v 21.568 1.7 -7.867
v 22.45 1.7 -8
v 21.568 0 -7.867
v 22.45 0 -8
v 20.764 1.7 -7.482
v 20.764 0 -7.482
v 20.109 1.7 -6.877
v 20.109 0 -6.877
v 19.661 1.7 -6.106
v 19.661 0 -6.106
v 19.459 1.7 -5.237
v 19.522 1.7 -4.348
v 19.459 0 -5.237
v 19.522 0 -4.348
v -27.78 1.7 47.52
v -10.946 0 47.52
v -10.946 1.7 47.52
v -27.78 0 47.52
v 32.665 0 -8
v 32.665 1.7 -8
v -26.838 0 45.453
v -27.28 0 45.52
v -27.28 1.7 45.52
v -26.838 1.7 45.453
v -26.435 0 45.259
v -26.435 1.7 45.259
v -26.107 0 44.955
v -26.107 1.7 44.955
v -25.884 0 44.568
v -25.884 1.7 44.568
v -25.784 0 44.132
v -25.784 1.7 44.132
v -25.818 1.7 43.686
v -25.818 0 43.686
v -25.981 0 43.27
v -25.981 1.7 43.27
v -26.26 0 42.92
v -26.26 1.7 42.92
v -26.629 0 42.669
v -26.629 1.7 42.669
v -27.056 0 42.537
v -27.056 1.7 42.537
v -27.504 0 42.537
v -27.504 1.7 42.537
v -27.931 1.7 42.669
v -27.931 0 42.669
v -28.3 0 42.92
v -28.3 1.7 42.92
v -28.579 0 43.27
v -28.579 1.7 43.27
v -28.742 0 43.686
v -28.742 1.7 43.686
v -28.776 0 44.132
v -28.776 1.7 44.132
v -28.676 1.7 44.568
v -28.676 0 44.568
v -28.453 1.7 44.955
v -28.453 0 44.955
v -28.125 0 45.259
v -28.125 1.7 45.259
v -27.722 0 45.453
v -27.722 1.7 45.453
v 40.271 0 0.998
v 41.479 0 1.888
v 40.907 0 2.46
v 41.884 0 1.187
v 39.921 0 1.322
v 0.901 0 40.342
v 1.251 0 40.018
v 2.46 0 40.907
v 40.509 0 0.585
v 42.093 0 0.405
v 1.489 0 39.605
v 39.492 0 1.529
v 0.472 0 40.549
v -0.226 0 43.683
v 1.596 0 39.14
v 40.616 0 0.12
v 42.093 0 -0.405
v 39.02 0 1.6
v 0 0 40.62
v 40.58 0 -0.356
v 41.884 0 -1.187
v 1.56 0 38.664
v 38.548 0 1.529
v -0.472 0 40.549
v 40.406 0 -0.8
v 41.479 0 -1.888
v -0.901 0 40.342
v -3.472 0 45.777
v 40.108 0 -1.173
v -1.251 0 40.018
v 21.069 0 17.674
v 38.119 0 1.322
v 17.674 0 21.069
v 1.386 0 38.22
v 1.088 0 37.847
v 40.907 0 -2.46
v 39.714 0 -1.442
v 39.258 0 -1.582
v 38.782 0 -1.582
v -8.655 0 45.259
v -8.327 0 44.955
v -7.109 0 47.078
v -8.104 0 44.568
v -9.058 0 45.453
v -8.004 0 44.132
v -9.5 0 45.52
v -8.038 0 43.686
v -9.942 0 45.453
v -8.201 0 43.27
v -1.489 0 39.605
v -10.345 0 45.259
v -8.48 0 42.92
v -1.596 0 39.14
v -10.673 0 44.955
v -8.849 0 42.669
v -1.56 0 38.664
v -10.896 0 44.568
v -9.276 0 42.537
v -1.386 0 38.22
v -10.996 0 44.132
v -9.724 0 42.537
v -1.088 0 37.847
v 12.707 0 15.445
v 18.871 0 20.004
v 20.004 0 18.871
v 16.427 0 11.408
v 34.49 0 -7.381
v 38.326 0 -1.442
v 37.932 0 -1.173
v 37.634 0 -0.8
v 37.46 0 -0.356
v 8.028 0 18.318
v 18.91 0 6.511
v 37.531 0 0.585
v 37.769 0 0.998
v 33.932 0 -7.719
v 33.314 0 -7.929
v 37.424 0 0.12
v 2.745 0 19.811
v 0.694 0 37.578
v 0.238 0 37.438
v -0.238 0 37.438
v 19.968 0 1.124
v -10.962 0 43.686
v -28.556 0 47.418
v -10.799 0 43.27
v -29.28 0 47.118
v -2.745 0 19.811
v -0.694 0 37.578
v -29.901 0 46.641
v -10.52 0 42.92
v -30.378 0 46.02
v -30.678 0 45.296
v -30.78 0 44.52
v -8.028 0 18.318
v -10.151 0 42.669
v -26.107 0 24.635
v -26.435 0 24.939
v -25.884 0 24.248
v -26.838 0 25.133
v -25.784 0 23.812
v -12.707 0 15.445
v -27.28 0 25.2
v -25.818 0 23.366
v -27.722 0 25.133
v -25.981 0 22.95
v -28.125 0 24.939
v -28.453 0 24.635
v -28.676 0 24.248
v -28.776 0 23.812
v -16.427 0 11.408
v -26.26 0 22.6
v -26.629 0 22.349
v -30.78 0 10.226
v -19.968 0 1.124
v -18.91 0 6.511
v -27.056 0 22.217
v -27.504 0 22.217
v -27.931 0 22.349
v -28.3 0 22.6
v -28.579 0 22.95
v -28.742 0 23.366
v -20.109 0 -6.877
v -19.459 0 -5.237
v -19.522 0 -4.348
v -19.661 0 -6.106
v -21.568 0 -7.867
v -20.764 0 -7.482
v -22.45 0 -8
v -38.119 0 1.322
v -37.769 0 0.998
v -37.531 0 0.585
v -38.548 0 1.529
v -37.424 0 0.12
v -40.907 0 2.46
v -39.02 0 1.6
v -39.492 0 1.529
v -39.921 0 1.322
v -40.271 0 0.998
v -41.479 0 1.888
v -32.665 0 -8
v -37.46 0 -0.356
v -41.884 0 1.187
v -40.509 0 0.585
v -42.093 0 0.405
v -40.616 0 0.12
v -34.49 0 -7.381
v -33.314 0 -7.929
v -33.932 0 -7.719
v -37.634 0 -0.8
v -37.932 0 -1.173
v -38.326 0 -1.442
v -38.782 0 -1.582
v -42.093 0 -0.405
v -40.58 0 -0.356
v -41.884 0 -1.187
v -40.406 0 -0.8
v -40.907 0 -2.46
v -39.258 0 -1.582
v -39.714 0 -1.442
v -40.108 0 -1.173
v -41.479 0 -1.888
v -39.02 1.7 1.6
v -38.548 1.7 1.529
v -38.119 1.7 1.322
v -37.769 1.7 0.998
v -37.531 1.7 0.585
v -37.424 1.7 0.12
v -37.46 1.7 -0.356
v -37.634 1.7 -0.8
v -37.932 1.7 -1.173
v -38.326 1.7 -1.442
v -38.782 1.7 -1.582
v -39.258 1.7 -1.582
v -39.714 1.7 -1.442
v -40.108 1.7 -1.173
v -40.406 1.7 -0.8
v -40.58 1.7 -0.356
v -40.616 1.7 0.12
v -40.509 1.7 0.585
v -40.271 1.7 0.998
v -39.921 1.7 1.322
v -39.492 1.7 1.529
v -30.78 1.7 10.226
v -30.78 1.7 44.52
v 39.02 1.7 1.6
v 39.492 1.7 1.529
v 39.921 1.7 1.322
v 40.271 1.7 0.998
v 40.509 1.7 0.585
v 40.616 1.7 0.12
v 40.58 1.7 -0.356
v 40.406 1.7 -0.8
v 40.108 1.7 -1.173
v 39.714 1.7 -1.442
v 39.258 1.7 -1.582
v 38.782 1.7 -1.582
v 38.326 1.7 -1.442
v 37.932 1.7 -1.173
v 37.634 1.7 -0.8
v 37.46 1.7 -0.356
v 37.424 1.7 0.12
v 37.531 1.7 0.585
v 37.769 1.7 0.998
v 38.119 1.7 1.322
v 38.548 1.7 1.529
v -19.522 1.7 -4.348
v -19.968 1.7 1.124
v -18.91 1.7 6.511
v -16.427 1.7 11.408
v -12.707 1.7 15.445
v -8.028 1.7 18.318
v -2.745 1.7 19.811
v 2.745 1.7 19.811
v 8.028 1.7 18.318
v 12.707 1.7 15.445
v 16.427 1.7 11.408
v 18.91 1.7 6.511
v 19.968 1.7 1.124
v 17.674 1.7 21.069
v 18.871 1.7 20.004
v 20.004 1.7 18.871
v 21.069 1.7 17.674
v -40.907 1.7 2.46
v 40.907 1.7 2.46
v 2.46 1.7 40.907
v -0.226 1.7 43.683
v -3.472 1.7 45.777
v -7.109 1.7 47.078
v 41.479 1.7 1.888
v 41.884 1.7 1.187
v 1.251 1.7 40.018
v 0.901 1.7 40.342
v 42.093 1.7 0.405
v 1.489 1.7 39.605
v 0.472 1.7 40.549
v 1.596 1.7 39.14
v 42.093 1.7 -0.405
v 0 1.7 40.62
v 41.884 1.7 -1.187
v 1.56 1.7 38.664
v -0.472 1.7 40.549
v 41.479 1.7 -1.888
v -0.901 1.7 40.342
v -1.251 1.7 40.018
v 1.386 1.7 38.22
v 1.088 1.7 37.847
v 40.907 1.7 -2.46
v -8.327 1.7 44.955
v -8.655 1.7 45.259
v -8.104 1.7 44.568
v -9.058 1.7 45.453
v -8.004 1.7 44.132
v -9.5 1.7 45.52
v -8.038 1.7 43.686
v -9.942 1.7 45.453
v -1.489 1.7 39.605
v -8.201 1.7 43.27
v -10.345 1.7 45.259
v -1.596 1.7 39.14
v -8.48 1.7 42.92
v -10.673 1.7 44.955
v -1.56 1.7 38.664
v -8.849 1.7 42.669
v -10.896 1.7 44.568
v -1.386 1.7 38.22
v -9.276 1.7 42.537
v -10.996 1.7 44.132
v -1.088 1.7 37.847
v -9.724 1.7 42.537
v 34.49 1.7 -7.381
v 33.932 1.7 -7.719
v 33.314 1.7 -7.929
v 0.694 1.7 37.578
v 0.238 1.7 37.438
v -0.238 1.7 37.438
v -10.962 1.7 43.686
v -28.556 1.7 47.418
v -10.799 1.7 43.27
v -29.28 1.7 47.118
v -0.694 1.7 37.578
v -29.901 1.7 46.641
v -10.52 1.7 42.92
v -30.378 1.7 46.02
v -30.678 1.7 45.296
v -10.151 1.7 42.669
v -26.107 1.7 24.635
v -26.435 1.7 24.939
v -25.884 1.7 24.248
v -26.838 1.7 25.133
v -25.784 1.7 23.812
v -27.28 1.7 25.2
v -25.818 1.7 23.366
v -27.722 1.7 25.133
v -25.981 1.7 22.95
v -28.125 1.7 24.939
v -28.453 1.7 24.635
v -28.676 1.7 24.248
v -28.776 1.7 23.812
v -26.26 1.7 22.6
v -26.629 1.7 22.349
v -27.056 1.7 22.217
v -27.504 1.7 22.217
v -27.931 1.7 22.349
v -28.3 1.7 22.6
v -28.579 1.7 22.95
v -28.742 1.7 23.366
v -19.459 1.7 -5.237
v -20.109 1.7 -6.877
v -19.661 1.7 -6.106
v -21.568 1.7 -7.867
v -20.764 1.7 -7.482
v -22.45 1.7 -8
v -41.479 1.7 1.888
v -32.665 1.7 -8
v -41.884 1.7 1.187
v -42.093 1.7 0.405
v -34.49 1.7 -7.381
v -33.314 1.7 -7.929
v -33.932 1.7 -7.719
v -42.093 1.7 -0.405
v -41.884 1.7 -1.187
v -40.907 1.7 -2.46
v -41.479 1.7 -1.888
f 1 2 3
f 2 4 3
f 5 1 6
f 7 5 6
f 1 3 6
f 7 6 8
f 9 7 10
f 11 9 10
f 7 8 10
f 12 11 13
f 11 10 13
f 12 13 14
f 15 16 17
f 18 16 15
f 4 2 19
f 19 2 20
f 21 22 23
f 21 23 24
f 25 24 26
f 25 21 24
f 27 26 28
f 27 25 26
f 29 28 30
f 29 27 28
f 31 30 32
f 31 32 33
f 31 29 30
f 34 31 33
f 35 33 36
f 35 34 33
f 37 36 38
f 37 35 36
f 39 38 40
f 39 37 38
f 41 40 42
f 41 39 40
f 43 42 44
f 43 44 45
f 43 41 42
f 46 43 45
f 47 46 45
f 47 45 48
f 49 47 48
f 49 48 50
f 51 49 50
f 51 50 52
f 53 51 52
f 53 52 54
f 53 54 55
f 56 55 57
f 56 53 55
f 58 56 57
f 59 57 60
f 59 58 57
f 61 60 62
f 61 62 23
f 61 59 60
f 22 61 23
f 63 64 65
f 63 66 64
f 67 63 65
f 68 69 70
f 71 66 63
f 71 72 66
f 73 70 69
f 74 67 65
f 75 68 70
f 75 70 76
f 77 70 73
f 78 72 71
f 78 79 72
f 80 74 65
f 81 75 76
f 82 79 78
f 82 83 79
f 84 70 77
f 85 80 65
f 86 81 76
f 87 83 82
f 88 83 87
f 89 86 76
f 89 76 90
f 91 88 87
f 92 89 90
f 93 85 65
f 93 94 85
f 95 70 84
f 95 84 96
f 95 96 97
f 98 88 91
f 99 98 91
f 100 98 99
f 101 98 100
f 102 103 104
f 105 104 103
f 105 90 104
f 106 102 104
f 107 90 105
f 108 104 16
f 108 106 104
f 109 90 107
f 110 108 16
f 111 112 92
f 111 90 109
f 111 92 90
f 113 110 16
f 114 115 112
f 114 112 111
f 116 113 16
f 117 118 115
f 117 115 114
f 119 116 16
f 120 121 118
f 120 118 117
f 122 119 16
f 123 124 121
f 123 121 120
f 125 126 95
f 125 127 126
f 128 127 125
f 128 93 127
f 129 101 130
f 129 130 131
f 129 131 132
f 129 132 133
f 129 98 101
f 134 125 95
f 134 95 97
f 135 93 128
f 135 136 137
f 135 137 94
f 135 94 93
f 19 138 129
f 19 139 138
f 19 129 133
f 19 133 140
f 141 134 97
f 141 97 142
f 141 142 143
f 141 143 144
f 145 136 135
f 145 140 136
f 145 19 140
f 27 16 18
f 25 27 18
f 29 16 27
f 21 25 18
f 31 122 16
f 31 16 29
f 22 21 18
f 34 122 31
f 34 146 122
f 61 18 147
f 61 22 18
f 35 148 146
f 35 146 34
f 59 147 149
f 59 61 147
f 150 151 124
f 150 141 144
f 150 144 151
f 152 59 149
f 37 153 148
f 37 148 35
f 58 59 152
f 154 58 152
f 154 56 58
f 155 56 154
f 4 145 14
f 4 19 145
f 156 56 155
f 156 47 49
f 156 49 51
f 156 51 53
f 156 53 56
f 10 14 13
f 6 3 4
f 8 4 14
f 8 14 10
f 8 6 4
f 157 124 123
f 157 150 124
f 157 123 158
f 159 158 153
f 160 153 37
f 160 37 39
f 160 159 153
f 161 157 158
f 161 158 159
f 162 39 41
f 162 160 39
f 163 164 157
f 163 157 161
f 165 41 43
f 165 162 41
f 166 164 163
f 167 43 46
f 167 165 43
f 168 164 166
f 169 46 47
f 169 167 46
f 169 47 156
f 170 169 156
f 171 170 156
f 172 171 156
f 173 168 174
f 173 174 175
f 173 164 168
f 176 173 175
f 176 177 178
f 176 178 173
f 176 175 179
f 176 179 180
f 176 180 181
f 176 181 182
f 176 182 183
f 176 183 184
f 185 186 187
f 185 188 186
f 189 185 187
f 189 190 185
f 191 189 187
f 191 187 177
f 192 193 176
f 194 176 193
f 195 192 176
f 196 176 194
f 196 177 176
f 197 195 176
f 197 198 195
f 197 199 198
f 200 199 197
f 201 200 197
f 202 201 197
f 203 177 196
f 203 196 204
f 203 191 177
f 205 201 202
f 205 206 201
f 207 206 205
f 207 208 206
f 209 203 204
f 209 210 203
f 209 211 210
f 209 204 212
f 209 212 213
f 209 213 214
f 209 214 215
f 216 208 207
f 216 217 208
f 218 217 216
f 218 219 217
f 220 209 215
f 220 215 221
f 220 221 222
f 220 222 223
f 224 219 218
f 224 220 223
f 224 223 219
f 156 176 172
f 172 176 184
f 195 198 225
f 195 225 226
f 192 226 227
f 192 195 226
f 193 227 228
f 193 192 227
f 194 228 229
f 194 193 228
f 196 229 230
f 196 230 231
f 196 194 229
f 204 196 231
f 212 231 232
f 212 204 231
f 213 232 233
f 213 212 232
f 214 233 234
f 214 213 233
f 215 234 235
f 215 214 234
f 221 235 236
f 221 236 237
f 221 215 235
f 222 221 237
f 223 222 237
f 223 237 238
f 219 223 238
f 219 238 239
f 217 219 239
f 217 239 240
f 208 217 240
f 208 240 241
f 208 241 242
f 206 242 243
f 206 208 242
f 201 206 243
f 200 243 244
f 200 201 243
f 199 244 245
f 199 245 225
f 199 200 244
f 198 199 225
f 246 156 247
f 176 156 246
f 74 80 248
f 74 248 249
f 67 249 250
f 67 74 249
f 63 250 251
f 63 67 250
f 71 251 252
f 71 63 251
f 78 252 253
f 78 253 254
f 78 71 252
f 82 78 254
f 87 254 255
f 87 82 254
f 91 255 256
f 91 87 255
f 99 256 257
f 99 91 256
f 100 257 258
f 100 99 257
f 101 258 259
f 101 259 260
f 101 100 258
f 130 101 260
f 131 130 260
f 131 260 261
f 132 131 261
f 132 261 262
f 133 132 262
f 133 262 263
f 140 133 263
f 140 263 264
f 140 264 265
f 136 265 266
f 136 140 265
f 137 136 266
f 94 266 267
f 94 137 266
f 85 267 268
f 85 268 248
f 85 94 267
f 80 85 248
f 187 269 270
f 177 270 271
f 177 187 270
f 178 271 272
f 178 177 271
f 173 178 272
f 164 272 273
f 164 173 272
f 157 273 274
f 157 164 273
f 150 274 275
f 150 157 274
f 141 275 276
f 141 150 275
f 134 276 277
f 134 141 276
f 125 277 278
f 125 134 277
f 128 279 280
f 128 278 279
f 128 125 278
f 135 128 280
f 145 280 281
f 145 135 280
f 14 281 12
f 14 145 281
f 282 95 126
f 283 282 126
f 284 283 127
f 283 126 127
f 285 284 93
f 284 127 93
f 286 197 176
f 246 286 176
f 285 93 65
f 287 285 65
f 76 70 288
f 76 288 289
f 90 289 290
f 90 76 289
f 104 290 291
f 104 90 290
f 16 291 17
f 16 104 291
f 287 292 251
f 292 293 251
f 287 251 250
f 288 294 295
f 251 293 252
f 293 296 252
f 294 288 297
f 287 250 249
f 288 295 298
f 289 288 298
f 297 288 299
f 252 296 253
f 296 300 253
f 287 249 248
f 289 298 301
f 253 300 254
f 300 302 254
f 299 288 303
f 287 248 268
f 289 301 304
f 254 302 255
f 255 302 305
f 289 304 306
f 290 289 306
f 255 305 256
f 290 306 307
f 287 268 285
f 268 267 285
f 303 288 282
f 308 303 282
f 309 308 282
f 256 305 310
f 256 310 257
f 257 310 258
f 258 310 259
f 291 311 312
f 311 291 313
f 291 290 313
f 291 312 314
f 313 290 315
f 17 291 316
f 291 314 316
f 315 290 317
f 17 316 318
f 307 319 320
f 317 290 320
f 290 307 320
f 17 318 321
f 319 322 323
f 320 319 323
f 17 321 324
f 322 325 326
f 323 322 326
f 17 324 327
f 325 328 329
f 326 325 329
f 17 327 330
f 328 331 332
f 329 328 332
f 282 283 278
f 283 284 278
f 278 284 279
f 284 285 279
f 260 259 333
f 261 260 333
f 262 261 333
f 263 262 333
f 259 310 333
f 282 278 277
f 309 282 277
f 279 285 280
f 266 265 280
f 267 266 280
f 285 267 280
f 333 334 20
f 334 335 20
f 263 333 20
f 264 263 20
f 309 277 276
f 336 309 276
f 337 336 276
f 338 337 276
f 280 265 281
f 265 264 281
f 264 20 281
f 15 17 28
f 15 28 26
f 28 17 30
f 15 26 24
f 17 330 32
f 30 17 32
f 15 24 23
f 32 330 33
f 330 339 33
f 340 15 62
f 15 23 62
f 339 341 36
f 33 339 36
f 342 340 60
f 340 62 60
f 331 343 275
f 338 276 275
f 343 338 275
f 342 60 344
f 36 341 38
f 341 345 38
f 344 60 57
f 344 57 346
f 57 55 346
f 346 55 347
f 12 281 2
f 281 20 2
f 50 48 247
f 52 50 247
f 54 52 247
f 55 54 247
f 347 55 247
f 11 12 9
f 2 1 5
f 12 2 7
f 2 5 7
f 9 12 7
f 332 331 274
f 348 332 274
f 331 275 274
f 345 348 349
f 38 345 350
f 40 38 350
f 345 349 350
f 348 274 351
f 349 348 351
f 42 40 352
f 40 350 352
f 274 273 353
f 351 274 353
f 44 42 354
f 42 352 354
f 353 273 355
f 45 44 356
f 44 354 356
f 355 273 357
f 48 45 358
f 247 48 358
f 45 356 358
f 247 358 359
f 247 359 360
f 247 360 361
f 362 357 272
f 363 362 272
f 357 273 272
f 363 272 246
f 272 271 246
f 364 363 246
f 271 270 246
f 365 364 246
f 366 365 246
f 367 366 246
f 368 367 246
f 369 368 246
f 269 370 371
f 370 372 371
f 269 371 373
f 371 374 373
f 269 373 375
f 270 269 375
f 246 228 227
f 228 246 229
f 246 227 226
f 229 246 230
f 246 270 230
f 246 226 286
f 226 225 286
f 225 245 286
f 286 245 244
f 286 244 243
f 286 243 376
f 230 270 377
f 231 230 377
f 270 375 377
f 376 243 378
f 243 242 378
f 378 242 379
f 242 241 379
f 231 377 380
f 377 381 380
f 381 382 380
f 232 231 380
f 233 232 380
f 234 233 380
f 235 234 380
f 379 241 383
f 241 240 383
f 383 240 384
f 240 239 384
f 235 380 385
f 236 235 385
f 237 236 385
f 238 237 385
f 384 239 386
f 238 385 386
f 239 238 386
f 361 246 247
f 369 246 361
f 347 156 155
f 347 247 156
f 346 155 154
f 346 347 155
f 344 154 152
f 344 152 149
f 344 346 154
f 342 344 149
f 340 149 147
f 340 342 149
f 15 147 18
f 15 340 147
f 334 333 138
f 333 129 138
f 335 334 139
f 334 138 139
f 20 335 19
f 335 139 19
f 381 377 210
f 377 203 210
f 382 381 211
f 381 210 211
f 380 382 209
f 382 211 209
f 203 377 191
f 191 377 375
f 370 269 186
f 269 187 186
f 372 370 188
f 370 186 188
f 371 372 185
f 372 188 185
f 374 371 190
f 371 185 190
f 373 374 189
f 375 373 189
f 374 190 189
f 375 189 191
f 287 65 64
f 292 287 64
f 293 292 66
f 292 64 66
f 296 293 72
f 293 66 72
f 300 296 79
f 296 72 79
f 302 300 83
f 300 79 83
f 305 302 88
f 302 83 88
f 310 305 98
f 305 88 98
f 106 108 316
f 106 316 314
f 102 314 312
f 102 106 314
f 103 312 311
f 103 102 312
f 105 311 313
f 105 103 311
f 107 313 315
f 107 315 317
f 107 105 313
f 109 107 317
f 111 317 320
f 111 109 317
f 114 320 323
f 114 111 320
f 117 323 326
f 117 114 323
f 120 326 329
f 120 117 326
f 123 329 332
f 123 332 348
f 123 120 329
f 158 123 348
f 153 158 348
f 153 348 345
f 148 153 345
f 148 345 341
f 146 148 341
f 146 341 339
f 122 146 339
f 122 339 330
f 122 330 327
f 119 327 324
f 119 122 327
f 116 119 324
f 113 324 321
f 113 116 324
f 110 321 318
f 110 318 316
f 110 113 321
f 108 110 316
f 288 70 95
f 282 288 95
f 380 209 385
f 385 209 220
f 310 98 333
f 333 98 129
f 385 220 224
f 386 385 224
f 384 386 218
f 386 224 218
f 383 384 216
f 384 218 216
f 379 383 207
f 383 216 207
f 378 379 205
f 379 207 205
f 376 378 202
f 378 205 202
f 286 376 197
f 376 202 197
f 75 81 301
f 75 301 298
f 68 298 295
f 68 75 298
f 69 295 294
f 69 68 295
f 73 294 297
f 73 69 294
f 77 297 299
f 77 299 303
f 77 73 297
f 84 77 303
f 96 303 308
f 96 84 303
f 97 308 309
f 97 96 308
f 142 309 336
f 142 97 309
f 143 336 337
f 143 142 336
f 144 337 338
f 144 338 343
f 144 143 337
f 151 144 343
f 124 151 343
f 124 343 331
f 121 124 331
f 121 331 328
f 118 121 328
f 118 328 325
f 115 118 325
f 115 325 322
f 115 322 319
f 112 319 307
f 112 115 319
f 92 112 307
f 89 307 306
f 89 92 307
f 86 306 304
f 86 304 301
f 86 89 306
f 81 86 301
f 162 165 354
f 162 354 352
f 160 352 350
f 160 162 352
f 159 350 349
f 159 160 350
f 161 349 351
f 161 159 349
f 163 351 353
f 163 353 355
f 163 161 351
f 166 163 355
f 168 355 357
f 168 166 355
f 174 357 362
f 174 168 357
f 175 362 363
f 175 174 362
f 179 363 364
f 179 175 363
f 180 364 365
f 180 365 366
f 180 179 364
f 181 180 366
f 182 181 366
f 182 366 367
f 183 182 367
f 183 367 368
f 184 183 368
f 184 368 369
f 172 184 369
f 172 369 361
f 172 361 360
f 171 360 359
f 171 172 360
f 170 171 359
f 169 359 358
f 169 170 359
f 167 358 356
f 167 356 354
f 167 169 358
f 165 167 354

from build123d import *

# Parameters (mm, degrees)
SKETCH1_R           = 1.6
SKETCH1_R_2         = 20
BOSS_EXTRUDE2_DEPTH = 1.7
BOSS_EXTRUDE3_START = -1.7
SKETCH2_R           = 1.5
BOSS_EXTRUDE3_DEPTH = 1.7
SKETCH3_W           = 67.365157796
SKETCH3_H           = 36
CUT_EXTRUDE1_DEPTH  = 1.7
FILLET1_R           = 3


with BuildPart() as part:
    # Sketch1 → Boss-Extrude2 (new body)
    with BuildSketch(Plane(origin=(0, 0, 0), x_dir=(1, 0, 0), z_dir=(0, 1, 0))):
        with BuildLine():
            Line((-17.673720383, -21.068687852), (-2.459890554, -40.906514899))
            ThreePointArc((-2.459890554, -40.906514899), (0, -42.12), (2.459890554, -40.906514899))
            Line((2.459890554, -40.906514899), (17.673720383, -21.068687852))
            ThreePointArc((17.673720383, -21.068687852), (19.445436483, -19.445436483), (21.068687852, -17.673720383))
            Line((21.068687852, -17.673720383), (40.906514899, -2.459890554))
            ThreePointArc((40.906514899, -2.459890554), (42.12, 0), (40.906514899, 2.459890554))
            Line((40.906514899, 2.459890554), (21.068687852, 17.673720383))
            ThreePointArc((21.068687852, 17.673720383), (19.445436483, 19.445436483), (17.673720383, 21.068687852))
            Line((17.673720383, 21.068687852), (2.459890554, 40.906514899))
            ThreePointArc((2.459890554, 40.906514899), (0, 42.12), (-2.459890554, 40.906514899))
            Line((-2.459890554, 40.906514899), (-17.673720383, 21.068687852))
            ThreePointArc((-17.673720383, 21.068687852), (-19.445436483, 19.445436483), (-21.068687852, 17.673720383))
            Line((-21.068687852, 17.673720383), (-40.906514899, 2.459890554))
            ThreePointArc((-40.906514899, 2.459890554), (-42.12, 0), (-40.906514899, -2.459890554))
            Line((-40.906514899, -2.459890554), (-21.068687852, -17.673720383))
            ThreePointArc((-21.068687852, -17.673720383), (-19.445436483, -19.445436483), (-17.673720383, -21.068687852))
        make_face()
        with Locations(Location((0, -39.02, 0), (0, 0, 270))):
            Circle(SKETCH1_R, mode=Mode.SUBTRACT)
        with Locations(Location((0, 0, 0), (0, 0, 270))):
            Circle(SKETCH1_R_2, mode=Mode.SUBTRACT)
        with Locations(Location((-39.02, 0, 0), (0, 0, 270))):
            Circle(SKETCH1_R, mode=Mode.SUBTRACT)
        with Locations(Location((39.02, 0, 0), (0, 0, 270))):
            Circle(SKETCH1_R, mode=Mode.SUBTRACT)
        with Locations(Location((0, 39.02, 0), (0, 0, 270))):
            Circle(SKETCH1_R, mode=Mode.SUBTRACT)
    extrude(amount=BOSS_EXTRUDE2_DEPTH)

    # Sketch2 → Boss-Extrude3 (add)
    with BuildSketch(Plane(origin=(0, 1.7, 0), x_dir=(1, 0, 0), z_dir=(0, 1, 0)).offset(BOSS_EXTRUDE3_START)):
        with BuildLine():
            Line((-30.78, -47.52), (-30.78, -10.226017059))
            Line((-30.78, -10.226017059), (-21.068687852, -17.673720383))
            ThreePointArc((-21.068687852, -17.673720383), (-19.445436483, -19.445436483), (-17.673720383, -21.068687852))
            Line((-17.673720383, -21.068687852), (-2.459890554, -40.906514899))
            ThreePointArc((-2.459890554, -40.906514899), (0, -42.12), (2.459890554, -40.906514899))
            ThreePointArc((2.459890554, -40.906514899), (-3.472049402, -45.77668656), (-10.946495328, -47.52))
            Line((-10.946495328, -47.52), (-30.78, -47.52))
        make_face()
        with Locations(Location((-9.5, -44.02, 0), (0, 0, 270))):
            Circle(SKETCH2_R, mode=Mode.SUBTRACT)
        with Locations(Location((-27.28, -44.02, 0), (0, 0, 270))):
            Circle(SKETCH2_R, mode=Mode.SUBTRACT)
        with Locations(Location((-27.28, -23.7, 0), (0, 0, 270))):
            Circle(SKETCH2_R, mode=Mode.SUBTRACT)
    extrude(amount=BOSS_EXTRUDE3_DEPTH)

    # Sketch3 → Cut-Extrude1 (cut)
    with BuildSketch(Plane(origin=(0, 1.7, 0), x_dir=(1, 0, 0), z_dir=(0, 1, 0))):
        with Locations((0, 26)):
            Rectangle(SKETCH3_W, SKETCH3_H)
    extrude(amount=-CUT_EXTRUDE1_DEPTH, mode=Mode.SUBTRACT)

    # Fillet1
    fillet1_edges = [part.edges().sort_by_distance(p)[0] for p in [
        (-18.33030278, 0.85, -8),
        (18.33030278, 0.85, -8),
        (-33.682578898, 0.85, -8),
        (33.682578898, 0.85, -8),
        (-30.78, 0.85, 47.52),
    ]]
    fillet(fillet1_edges, radius=FILLET1_R)


solid = part.part
